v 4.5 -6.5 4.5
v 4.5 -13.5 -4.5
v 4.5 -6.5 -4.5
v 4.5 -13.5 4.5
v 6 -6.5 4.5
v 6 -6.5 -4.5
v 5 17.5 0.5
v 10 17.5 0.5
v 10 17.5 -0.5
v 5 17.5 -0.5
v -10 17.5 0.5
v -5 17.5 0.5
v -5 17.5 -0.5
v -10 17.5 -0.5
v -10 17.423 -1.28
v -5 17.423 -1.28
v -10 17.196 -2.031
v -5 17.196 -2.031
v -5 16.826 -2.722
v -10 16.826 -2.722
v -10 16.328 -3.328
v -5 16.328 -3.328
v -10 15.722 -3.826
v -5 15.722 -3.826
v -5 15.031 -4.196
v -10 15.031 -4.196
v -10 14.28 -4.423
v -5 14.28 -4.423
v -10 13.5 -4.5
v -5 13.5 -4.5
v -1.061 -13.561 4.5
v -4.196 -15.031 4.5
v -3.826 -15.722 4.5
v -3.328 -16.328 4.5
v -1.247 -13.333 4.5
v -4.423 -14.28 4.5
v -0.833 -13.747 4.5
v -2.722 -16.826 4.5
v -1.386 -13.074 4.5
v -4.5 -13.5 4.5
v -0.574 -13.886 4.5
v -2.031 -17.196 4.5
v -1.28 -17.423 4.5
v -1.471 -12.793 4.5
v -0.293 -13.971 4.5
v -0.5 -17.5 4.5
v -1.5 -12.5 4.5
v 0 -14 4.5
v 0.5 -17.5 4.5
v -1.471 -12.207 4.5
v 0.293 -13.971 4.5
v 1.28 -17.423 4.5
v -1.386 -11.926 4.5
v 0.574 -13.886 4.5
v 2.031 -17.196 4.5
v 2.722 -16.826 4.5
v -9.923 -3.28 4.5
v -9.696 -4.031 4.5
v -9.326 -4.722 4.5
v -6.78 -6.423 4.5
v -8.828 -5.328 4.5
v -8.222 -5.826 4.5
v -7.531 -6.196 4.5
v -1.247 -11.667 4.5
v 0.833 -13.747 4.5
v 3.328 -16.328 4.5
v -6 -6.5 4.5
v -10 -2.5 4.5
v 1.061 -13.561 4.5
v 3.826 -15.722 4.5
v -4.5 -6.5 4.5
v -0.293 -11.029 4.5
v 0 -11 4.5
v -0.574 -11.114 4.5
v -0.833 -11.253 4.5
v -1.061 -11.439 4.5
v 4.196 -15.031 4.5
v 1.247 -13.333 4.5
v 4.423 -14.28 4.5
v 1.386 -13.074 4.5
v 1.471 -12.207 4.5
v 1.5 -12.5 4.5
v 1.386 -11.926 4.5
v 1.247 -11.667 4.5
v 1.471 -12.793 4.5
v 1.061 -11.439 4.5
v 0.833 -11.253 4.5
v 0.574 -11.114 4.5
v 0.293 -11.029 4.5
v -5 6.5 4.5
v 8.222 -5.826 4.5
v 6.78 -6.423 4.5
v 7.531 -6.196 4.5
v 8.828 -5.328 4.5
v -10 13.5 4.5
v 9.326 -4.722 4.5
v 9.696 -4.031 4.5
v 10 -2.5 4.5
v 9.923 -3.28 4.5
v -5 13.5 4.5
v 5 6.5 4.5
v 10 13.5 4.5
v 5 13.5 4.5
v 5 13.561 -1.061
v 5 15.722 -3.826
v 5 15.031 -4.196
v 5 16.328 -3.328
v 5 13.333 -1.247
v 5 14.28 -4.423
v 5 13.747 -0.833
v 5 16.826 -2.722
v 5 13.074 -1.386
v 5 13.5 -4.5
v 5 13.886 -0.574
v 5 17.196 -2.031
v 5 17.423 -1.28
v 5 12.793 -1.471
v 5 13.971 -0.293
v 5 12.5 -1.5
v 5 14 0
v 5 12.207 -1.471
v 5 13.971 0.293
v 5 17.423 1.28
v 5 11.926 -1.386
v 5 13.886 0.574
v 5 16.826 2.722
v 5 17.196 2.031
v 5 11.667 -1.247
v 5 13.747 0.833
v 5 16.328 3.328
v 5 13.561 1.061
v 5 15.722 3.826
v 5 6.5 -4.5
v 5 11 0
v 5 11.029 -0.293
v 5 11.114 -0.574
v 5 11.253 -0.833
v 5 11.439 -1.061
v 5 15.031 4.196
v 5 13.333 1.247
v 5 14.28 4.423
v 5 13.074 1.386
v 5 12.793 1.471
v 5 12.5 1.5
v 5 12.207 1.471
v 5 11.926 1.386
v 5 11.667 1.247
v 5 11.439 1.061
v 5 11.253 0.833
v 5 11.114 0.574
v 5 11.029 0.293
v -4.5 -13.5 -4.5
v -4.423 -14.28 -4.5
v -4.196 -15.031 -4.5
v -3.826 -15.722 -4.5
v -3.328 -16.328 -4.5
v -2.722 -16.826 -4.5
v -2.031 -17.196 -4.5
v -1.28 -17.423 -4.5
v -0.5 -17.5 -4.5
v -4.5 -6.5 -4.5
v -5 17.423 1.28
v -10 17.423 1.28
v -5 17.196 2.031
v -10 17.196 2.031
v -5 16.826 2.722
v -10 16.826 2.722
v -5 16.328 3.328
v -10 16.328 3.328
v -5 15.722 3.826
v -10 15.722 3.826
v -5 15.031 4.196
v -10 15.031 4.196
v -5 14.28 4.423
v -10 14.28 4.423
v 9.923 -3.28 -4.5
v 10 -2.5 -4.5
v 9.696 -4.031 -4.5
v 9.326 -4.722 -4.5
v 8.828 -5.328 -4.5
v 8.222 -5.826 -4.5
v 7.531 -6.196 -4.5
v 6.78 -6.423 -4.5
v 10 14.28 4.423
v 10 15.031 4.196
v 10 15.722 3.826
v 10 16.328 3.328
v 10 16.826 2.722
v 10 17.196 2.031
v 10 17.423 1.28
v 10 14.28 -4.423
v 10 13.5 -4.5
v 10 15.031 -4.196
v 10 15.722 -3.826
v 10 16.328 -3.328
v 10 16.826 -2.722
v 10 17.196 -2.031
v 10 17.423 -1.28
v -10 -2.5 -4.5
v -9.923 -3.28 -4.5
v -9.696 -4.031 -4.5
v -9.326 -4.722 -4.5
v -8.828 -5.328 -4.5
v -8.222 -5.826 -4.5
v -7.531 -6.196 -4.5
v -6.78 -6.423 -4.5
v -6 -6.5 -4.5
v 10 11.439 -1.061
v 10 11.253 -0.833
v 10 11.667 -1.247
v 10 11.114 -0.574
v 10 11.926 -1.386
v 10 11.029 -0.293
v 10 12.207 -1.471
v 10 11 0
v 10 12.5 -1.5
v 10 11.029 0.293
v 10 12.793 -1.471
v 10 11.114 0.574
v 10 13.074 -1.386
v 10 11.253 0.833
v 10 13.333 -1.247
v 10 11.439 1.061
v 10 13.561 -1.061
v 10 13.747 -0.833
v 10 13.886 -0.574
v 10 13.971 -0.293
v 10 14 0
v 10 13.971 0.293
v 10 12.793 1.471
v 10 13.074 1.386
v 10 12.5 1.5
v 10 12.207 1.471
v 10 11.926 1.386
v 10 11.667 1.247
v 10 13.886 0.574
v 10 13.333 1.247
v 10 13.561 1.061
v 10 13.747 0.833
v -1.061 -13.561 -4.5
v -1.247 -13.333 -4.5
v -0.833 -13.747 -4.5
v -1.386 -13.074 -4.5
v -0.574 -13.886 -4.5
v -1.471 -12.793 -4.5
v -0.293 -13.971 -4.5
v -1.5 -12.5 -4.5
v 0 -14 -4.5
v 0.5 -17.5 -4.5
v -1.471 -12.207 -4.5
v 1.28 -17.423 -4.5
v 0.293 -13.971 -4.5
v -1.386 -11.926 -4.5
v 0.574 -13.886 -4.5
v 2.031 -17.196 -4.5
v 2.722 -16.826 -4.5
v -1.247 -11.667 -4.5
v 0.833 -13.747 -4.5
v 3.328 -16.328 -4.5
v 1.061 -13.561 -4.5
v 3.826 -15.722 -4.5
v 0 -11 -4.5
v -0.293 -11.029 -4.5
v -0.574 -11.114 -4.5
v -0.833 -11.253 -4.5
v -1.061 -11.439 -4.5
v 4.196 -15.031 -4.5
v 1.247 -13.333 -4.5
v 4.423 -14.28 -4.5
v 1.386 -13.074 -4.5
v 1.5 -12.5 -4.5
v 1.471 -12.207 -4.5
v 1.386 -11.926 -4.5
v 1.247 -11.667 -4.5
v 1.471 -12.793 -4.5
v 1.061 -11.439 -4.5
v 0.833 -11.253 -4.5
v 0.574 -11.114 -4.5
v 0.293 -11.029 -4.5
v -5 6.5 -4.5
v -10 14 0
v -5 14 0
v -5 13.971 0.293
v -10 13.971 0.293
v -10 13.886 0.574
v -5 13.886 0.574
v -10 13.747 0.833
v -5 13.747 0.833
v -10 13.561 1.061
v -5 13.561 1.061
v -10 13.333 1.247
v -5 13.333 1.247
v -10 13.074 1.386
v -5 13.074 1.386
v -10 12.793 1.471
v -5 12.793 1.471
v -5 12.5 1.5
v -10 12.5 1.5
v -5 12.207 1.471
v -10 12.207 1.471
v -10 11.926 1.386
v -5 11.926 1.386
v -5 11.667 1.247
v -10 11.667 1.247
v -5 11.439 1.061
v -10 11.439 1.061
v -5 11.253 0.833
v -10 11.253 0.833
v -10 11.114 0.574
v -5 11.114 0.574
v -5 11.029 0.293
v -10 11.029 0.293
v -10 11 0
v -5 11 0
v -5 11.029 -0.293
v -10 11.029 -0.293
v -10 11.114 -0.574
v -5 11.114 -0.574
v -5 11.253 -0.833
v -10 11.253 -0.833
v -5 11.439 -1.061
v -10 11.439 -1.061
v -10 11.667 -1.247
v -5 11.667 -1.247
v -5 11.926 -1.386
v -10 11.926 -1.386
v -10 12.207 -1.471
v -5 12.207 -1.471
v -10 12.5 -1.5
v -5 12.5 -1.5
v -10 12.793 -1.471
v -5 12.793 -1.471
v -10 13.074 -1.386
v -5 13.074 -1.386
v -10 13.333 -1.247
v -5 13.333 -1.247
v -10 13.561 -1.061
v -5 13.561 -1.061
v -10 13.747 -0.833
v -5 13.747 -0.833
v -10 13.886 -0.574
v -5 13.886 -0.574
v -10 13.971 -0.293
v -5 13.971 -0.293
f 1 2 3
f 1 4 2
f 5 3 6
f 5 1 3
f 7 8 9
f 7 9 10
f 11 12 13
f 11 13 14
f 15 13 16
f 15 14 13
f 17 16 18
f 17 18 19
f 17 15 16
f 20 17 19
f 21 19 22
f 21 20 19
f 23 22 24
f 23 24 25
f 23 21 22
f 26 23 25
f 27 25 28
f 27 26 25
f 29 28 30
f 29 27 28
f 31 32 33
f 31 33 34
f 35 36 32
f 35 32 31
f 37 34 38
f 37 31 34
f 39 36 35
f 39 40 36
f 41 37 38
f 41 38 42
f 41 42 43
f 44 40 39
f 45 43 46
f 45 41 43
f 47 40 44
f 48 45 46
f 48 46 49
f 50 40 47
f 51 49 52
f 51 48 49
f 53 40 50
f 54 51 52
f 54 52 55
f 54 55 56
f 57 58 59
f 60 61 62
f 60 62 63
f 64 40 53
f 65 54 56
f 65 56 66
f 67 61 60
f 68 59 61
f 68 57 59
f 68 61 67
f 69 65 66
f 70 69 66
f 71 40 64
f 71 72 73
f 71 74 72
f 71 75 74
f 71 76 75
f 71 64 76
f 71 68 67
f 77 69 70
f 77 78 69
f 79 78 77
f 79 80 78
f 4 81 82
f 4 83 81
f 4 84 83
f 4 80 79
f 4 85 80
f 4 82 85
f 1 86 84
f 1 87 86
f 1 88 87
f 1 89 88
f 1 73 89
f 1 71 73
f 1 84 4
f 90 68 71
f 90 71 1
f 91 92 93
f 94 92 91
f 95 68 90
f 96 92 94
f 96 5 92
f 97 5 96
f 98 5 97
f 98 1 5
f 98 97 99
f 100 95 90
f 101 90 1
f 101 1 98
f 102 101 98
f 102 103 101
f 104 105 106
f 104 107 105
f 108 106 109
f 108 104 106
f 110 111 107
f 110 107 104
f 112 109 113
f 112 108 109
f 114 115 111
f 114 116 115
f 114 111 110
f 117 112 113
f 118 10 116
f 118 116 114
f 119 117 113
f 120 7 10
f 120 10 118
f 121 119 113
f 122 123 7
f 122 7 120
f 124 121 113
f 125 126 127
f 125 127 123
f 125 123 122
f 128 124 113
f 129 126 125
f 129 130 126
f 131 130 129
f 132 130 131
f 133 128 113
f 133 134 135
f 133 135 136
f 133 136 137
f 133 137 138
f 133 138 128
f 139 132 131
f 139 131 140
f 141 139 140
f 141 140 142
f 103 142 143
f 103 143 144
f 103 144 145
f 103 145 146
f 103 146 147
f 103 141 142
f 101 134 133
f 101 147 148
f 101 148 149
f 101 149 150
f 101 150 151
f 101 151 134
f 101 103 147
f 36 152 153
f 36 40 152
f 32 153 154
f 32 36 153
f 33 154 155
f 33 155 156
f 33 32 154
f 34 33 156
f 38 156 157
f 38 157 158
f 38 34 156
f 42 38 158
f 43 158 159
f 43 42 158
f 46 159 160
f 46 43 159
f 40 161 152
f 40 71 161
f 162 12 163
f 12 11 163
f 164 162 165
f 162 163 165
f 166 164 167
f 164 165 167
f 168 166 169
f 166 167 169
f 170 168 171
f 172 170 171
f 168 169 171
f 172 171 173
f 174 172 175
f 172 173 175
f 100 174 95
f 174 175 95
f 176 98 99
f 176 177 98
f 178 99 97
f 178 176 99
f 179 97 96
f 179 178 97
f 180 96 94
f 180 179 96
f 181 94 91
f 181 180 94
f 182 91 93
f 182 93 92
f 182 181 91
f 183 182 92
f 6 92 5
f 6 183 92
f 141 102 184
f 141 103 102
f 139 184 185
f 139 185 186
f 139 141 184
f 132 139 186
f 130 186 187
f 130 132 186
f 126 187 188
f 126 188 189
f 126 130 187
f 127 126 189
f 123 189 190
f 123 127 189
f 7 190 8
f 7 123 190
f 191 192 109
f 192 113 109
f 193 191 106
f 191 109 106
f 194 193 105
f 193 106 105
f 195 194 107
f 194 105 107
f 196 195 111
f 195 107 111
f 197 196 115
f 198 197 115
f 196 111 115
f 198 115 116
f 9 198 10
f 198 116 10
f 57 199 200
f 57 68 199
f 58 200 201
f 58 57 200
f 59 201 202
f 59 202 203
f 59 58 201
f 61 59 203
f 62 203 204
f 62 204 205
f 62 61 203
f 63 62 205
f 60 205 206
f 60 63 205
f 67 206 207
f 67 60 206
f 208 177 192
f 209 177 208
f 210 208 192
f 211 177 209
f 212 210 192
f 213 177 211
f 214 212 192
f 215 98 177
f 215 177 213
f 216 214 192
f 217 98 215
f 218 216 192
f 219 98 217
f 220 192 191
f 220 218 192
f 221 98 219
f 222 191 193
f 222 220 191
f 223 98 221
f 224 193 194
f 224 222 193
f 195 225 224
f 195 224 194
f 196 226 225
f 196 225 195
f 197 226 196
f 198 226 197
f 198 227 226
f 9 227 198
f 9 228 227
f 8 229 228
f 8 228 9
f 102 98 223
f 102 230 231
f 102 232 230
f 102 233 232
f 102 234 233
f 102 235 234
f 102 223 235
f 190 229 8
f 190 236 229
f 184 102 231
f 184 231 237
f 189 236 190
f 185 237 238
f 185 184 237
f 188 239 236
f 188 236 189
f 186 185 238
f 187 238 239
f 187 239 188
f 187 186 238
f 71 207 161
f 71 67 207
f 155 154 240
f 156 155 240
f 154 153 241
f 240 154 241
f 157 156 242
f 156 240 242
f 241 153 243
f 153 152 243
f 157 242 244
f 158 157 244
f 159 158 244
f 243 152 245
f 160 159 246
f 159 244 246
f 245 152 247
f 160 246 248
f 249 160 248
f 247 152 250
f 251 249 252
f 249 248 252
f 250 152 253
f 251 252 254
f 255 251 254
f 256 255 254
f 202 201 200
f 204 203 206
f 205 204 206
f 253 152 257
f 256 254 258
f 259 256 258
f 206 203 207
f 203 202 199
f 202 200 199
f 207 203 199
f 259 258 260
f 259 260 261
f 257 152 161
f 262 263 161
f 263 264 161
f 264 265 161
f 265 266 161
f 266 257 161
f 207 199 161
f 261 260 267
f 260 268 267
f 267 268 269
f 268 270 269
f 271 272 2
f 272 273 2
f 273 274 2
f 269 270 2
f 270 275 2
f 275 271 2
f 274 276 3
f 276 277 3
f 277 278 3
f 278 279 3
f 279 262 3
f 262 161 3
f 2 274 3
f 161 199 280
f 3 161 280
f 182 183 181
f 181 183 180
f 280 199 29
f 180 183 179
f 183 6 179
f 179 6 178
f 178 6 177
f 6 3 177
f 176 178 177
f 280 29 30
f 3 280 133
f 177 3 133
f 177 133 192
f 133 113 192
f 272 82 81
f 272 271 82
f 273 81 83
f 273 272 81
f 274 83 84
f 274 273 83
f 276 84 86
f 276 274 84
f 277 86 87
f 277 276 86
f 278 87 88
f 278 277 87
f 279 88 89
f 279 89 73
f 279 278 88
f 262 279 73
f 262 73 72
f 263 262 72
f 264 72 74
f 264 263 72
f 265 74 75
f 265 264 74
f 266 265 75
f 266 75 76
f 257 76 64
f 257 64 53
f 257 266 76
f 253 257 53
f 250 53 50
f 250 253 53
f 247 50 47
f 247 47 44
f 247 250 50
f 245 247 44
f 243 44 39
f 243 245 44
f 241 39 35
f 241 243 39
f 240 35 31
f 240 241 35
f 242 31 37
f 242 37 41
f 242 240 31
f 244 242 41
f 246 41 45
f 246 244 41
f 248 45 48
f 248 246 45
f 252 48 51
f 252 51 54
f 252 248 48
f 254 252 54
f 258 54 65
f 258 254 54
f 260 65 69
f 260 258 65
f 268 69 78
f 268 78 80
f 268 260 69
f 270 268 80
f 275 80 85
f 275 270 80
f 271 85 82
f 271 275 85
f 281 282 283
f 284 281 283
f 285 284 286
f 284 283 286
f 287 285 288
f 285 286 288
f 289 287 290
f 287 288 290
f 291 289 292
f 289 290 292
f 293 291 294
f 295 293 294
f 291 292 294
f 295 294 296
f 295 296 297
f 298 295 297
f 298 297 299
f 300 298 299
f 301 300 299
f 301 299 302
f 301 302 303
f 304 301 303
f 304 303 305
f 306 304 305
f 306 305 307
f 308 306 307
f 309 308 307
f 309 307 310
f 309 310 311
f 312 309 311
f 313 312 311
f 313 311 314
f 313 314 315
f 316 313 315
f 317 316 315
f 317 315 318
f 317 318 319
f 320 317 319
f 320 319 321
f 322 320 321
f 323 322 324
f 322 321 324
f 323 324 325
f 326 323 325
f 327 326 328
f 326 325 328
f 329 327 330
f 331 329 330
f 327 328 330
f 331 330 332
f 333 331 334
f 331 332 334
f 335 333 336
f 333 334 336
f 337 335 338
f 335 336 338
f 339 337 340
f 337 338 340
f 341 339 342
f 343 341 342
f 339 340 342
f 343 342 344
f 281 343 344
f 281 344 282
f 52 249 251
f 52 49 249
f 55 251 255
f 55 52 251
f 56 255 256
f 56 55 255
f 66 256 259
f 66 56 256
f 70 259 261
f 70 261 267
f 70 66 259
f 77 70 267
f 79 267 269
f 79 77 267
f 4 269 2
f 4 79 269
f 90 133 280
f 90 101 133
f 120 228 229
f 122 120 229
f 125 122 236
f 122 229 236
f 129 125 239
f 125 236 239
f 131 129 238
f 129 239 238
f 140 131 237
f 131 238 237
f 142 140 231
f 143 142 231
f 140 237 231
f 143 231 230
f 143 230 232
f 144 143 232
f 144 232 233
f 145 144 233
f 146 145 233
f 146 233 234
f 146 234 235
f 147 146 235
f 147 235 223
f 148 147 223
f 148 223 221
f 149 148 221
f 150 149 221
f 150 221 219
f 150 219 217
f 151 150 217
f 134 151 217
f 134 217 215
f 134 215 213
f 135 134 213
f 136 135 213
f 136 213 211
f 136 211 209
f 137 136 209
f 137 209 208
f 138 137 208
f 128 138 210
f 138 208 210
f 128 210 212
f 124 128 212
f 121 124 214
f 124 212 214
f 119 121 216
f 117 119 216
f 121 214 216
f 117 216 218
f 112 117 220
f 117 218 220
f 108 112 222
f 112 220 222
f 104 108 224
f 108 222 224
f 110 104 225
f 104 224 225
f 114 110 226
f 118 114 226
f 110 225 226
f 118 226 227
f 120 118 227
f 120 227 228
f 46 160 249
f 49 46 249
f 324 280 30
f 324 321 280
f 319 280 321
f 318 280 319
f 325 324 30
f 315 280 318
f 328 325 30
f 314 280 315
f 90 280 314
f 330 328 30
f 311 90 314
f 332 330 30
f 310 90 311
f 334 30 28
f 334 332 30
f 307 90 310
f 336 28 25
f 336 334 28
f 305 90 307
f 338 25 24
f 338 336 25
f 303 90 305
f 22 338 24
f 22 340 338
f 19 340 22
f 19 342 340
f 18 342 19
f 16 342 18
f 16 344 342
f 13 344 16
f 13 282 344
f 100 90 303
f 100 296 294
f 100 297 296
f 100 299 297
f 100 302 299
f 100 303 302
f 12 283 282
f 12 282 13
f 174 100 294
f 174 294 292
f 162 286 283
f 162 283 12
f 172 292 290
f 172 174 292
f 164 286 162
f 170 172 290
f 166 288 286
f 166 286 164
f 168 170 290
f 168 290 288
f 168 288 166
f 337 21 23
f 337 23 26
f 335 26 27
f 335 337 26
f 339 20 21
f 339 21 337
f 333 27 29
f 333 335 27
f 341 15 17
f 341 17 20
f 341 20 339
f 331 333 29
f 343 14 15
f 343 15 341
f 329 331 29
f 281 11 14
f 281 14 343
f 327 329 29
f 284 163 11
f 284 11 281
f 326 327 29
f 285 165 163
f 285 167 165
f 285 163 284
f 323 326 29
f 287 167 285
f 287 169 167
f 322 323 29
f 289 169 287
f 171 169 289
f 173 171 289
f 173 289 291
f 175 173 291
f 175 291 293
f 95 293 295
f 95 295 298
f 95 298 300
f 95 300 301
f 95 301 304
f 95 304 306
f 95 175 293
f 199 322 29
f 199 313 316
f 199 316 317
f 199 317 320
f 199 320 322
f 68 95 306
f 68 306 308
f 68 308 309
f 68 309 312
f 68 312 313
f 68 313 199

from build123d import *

# Parameters (mm, degrees)
F0_R     = 1.5
F1_DEPTH = 4.5
F2_R     = 1.5
F3_DEPTH = 20.001
F4_R     = 4


with BuildPart() as f1:
    # F0 (on Top) → F1 (new body, symmetric)
    with BuildSketch(Plane.XY):
        Polygon((-5, 17.5), (-10, 17.5), (-10, -6.5), (-4.5, -6.5), (-4.5, -17.5), (4.5, -17.5), (4.5, -6.5), (10, -6.5), (10, 17.5), (5, 17.5), (5, 6.5), (-5, 6.5), align=None)
        with Locations((0, -12.5)):
            Circle(F0_R, mode=Mode.SUBTRACT)
    extrude(amount=F1_DEPTH, both=True)

    # F2 (on face) → F3 (cut, through all)
    with BuildSketch(Plane.YZ.offset(10)):
        with Locations((12.5, 0)):
            Circle(F2_R)
    extrude(amount=-F3_DEPTH, mode=Mode.SUBTRACT)

    # F4
    f4_edges = [f1.edges().sort_by_distance(p)[0] for p in [
        (4.5, -17.5, 0),
        (-4.5, -17.5, 0),
        (7.5, 17.5, 4.5),
        (7.5, 17.5, -4.5),
        (-7.5, 17.5, -4.5),
        (-7.5, 17.5, 4.5),
        (10, -6.5, 0),
        (-10, -6.5, 0),
    ]]
    fillet(f4_edges, radius=F4_R)


solid = f1.part
